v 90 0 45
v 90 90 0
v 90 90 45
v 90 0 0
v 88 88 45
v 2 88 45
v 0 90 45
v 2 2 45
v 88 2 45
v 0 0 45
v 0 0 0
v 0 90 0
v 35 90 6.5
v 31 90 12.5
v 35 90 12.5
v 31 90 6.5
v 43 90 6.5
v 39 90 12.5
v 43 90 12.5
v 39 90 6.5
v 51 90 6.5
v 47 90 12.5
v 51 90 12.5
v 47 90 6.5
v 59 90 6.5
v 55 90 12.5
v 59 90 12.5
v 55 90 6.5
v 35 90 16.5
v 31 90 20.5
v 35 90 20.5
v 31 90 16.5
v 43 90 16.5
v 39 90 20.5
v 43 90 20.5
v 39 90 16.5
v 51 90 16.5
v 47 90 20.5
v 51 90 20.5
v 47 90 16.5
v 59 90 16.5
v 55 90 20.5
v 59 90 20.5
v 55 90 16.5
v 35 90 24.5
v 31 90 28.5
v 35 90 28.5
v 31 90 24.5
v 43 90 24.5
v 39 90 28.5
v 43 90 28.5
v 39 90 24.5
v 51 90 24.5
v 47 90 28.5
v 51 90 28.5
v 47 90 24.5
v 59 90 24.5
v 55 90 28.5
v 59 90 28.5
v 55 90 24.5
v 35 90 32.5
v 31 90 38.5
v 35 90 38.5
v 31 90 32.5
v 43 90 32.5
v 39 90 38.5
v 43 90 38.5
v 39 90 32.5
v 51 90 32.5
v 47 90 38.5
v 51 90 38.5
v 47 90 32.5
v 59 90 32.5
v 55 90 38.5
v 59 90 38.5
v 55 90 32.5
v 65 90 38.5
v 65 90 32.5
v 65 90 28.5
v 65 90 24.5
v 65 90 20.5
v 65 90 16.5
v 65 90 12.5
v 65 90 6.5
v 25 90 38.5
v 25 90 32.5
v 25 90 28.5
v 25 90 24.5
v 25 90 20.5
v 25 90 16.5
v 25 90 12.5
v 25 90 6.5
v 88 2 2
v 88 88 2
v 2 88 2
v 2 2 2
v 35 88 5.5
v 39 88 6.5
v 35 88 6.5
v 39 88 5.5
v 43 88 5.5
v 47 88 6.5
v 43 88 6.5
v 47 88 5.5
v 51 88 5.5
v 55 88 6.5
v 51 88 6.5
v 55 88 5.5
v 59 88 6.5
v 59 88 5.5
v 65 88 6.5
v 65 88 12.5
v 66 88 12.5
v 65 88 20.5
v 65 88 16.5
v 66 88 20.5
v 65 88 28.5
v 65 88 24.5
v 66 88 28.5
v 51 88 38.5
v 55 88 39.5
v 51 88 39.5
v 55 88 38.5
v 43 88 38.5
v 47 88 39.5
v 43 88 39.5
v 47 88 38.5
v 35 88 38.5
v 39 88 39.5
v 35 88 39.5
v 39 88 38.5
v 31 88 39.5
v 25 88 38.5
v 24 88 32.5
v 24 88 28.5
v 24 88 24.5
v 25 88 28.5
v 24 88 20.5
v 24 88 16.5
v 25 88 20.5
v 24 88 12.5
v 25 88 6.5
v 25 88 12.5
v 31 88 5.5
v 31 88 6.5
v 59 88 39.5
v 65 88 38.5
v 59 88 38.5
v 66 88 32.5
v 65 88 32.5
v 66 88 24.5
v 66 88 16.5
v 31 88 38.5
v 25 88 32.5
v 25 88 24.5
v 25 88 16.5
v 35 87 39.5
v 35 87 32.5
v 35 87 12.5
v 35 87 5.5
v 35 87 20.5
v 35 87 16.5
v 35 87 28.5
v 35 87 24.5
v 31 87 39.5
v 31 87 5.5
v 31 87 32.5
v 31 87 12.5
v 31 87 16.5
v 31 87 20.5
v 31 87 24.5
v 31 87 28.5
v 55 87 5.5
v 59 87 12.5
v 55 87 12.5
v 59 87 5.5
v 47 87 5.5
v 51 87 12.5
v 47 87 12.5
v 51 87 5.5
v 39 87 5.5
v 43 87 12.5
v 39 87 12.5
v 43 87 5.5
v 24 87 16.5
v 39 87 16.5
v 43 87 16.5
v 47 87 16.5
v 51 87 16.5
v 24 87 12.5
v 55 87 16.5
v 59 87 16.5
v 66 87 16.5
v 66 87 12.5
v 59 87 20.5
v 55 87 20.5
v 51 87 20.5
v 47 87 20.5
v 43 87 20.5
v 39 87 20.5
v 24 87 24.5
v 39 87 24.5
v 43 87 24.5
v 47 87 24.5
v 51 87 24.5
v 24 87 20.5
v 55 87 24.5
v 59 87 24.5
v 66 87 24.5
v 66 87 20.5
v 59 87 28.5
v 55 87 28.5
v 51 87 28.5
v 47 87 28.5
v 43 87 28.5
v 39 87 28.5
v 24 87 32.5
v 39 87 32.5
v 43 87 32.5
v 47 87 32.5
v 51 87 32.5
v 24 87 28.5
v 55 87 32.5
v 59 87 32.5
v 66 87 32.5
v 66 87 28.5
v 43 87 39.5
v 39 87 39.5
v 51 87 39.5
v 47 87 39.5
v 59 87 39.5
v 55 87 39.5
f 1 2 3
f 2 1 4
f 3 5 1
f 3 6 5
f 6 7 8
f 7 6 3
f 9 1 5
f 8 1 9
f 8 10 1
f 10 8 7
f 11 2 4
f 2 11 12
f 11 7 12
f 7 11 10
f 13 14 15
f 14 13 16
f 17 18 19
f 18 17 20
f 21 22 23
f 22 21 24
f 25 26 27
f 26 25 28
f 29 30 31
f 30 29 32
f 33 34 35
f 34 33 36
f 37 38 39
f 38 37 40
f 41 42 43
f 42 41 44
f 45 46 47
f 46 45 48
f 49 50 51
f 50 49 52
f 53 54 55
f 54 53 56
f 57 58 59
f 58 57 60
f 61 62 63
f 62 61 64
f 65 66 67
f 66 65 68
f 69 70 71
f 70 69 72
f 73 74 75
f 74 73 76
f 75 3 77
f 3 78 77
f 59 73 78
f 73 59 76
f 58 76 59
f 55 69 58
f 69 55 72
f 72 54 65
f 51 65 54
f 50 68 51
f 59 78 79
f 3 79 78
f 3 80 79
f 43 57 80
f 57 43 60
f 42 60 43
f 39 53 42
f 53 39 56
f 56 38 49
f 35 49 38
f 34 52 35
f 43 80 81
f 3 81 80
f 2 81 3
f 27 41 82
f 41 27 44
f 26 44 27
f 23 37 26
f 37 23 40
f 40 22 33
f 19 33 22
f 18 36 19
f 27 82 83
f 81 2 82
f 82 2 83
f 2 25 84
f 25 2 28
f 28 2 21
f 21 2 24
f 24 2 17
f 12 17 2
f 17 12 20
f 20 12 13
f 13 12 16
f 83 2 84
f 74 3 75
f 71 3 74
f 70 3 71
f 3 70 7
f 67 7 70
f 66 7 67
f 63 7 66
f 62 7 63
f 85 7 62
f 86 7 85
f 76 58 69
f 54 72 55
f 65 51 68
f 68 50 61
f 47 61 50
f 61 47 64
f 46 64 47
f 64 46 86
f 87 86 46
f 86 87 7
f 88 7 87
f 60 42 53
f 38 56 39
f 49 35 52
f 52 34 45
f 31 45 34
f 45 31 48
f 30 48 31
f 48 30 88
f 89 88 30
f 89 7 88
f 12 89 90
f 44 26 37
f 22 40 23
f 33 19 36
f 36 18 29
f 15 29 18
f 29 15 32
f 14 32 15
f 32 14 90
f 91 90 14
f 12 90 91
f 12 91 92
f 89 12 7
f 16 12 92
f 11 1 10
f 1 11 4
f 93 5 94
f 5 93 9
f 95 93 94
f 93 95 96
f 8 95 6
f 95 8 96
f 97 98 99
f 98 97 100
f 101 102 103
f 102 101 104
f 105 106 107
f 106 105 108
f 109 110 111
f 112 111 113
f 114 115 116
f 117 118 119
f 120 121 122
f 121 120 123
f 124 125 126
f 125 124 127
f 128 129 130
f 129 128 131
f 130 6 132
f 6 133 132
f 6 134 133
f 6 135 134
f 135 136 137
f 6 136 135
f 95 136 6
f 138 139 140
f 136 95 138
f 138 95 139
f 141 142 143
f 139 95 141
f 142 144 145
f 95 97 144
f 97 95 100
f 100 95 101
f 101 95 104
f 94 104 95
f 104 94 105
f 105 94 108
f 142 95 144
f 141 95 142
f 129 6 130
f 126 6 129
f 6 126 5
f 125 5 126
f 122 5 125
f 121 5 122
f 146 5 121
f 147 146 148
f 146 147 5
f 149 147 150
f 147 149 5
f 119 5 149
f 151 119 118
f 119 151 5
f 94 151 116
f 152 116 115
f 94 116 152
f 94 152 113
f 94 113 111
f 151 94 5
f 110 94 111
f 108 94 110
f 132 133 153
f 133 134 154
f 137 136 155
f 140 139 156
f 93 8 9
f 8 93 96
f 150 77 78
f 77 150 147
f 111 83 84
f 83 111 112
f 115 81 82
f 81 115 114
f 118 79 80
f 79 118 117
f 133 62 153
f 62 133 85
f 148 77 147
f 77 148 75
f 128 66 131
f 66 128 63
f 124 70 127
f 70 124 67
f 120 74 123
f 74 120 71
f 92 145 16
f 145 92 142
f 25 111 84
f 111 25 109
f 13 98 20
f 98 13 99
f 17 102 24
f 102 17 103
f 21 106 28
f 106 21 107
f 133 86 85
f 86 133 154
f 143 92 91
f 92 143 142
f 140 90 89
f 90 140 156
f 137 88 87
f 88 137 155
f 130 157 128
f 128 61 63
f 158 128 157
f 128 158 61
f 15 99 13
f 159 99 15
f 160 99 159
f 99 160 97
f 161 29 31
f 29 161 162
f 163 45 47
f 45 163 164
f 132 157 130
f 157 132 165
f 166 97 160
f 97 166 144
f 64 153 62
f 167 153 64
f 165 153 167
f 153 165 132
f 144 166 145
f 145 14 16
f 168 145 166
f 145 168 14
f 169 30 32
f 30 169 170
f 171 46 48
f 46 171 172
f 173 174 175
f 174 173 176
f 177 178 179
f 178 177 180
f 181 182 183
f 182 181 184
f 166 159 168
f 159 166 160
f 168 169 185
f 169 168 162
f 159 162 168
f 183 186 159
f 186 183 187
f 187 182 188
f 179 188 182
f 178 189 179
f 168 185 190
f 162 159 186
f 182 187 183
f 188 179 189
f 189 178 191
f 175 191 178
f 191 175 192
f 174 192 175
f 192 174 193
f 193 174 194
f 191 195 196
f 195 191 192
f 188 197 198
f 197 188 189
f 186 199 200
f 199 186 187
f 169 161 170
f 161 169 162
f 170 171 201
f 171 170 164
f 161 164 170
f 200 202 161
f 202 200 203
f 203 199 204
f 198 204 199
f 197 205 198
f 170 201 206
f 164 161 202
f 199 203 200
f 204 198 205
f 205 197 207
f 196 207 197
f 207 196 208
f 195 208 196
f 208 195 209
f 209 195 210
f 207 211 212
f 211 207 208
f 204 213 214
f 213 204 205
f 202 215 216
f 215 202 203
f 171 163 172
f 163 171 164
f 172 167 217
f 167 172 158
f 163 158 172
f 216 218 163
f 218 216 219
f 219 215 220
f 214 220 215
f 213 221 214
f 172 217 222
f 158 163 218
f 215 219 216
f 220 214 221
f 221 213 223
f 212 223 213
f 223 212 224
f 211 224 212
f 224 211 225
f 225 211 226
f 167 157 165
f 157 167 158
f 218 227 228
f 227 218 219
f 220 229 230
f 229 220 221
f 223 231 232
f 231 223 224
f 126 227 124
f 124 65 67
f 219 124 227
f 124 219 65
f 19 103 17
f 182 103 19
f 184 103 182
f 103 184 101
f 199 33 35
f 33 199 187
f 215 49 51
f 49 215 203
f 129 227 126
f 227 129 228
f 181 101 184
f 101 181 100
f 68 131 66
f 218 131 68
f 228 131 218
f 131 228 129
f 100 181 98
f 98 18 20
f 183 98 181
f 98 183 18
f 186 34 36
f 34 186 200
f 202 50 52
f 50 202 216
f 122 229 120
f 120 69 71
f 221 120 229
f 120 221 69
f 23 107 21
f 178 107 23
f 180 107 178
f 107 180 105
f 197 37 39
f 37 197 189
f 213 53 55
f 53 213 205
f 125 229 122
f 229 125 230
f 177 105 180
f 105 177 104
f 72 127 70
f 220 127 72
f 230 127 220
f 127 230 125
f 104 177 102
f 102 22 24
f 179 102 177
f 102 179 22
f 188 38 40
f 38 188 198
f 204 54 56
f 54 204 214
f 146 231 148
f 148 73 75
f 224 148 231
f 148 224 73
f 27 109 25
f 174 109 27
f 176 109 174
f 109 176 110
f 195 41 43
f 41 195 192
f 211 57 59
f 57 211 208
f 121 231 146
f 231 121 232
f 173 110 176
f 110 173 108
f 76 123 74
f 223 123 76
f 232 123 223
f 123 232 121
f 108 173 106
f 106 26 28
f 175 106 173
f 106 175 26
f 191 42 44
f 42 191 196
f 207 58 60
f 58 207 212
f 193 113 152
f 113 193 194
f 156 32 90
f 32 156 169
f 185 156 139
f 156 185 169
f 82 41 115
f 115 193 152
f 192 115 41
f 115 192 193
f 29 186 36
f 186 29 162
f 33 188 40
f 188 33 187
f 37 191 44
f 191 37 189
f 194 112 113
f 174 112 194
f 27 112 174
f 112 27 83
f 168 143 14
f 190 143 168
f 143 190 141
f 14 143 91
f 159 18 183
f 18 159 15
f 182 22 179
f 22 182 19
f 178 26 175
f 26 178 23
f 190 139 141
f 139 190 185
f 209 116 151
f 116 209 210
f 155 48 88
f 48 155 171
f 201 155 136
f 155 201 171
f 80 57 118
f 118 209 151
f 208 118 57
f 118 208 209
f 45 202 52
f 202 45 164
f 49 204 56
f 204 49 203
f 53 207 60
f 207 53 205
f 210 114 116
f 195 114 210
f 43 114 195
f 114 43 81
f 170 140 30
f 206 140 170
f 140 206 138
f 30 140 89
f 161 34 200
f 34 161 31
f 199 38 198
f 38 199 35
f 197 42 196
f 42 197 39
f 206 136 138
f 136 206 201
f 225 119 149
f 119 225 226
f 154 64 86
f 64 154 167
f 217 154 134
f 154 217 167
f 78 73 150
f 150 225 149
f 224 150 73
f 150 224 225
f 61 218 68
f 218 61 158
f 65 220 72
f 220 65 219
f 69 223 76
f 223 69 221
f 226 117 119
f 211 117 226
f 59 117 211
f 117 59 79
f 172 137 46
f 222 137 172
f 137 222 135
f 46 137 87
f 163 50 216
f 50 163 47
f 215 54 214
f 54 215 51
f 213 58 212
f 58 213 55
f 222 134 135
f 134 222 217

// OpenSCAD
$fn = 32;

// ----------------------------------------------------------------------
// Vent box: crossgrid enclosure
// ----------------------------------------------------------------------

// --- parameters (mm) ---
box_l = 90;               // box length, X
box_w = 90;               // box width, Y
box_h = 45;               // box height, Z
wall_t = 2;               // shell wall thickness
win_l = 40;               // vent window width, X
win_h = 32;               // vent window height, Z
bar_w = 4;                // grid bar width
n_v = 4;                  // vertical bar count
n_h = 3;                  // horizontal bar count

win_z0 = (box_h - win_h) / 2;  // window lower edge Z
v_step = win_l / (n_v + 1);  // vertical bar step
h_step = win_h / (n_h + 1);  // horizontal bar step

difference() {
  union() {
    difference() {
      cube([box_l, box_w, box_h]);
  translate([wall_t, wall_t, wall_t])
    cube([box_l - 2 * wall_t, box_w - 2 * wall_t, box_h]);
  translate([(box_l - win_l) / 2, box_w - wall_t - 1, win_z0])
    cube([win_l, wall_t + 2, win_h]);
    }
    for (i = [1 : n_v])
      translate([(box_l - win_l) / 2 + i * v_step - bar_w / 2,
                 box_w - wall_t - 1, win_z0 - 1])
        cube([bar_w, wall_t + 1, win_h + 2]);
    for (i = [1 : n_h])
      translate([(box_l - win_l) / 2 - 1, box_w - wall_t - 1,
                 win_z0 + i * h_step - bar_w / 2])
        cube([win_l + 2, wall_t + 1, bar_w]);
  }
}
